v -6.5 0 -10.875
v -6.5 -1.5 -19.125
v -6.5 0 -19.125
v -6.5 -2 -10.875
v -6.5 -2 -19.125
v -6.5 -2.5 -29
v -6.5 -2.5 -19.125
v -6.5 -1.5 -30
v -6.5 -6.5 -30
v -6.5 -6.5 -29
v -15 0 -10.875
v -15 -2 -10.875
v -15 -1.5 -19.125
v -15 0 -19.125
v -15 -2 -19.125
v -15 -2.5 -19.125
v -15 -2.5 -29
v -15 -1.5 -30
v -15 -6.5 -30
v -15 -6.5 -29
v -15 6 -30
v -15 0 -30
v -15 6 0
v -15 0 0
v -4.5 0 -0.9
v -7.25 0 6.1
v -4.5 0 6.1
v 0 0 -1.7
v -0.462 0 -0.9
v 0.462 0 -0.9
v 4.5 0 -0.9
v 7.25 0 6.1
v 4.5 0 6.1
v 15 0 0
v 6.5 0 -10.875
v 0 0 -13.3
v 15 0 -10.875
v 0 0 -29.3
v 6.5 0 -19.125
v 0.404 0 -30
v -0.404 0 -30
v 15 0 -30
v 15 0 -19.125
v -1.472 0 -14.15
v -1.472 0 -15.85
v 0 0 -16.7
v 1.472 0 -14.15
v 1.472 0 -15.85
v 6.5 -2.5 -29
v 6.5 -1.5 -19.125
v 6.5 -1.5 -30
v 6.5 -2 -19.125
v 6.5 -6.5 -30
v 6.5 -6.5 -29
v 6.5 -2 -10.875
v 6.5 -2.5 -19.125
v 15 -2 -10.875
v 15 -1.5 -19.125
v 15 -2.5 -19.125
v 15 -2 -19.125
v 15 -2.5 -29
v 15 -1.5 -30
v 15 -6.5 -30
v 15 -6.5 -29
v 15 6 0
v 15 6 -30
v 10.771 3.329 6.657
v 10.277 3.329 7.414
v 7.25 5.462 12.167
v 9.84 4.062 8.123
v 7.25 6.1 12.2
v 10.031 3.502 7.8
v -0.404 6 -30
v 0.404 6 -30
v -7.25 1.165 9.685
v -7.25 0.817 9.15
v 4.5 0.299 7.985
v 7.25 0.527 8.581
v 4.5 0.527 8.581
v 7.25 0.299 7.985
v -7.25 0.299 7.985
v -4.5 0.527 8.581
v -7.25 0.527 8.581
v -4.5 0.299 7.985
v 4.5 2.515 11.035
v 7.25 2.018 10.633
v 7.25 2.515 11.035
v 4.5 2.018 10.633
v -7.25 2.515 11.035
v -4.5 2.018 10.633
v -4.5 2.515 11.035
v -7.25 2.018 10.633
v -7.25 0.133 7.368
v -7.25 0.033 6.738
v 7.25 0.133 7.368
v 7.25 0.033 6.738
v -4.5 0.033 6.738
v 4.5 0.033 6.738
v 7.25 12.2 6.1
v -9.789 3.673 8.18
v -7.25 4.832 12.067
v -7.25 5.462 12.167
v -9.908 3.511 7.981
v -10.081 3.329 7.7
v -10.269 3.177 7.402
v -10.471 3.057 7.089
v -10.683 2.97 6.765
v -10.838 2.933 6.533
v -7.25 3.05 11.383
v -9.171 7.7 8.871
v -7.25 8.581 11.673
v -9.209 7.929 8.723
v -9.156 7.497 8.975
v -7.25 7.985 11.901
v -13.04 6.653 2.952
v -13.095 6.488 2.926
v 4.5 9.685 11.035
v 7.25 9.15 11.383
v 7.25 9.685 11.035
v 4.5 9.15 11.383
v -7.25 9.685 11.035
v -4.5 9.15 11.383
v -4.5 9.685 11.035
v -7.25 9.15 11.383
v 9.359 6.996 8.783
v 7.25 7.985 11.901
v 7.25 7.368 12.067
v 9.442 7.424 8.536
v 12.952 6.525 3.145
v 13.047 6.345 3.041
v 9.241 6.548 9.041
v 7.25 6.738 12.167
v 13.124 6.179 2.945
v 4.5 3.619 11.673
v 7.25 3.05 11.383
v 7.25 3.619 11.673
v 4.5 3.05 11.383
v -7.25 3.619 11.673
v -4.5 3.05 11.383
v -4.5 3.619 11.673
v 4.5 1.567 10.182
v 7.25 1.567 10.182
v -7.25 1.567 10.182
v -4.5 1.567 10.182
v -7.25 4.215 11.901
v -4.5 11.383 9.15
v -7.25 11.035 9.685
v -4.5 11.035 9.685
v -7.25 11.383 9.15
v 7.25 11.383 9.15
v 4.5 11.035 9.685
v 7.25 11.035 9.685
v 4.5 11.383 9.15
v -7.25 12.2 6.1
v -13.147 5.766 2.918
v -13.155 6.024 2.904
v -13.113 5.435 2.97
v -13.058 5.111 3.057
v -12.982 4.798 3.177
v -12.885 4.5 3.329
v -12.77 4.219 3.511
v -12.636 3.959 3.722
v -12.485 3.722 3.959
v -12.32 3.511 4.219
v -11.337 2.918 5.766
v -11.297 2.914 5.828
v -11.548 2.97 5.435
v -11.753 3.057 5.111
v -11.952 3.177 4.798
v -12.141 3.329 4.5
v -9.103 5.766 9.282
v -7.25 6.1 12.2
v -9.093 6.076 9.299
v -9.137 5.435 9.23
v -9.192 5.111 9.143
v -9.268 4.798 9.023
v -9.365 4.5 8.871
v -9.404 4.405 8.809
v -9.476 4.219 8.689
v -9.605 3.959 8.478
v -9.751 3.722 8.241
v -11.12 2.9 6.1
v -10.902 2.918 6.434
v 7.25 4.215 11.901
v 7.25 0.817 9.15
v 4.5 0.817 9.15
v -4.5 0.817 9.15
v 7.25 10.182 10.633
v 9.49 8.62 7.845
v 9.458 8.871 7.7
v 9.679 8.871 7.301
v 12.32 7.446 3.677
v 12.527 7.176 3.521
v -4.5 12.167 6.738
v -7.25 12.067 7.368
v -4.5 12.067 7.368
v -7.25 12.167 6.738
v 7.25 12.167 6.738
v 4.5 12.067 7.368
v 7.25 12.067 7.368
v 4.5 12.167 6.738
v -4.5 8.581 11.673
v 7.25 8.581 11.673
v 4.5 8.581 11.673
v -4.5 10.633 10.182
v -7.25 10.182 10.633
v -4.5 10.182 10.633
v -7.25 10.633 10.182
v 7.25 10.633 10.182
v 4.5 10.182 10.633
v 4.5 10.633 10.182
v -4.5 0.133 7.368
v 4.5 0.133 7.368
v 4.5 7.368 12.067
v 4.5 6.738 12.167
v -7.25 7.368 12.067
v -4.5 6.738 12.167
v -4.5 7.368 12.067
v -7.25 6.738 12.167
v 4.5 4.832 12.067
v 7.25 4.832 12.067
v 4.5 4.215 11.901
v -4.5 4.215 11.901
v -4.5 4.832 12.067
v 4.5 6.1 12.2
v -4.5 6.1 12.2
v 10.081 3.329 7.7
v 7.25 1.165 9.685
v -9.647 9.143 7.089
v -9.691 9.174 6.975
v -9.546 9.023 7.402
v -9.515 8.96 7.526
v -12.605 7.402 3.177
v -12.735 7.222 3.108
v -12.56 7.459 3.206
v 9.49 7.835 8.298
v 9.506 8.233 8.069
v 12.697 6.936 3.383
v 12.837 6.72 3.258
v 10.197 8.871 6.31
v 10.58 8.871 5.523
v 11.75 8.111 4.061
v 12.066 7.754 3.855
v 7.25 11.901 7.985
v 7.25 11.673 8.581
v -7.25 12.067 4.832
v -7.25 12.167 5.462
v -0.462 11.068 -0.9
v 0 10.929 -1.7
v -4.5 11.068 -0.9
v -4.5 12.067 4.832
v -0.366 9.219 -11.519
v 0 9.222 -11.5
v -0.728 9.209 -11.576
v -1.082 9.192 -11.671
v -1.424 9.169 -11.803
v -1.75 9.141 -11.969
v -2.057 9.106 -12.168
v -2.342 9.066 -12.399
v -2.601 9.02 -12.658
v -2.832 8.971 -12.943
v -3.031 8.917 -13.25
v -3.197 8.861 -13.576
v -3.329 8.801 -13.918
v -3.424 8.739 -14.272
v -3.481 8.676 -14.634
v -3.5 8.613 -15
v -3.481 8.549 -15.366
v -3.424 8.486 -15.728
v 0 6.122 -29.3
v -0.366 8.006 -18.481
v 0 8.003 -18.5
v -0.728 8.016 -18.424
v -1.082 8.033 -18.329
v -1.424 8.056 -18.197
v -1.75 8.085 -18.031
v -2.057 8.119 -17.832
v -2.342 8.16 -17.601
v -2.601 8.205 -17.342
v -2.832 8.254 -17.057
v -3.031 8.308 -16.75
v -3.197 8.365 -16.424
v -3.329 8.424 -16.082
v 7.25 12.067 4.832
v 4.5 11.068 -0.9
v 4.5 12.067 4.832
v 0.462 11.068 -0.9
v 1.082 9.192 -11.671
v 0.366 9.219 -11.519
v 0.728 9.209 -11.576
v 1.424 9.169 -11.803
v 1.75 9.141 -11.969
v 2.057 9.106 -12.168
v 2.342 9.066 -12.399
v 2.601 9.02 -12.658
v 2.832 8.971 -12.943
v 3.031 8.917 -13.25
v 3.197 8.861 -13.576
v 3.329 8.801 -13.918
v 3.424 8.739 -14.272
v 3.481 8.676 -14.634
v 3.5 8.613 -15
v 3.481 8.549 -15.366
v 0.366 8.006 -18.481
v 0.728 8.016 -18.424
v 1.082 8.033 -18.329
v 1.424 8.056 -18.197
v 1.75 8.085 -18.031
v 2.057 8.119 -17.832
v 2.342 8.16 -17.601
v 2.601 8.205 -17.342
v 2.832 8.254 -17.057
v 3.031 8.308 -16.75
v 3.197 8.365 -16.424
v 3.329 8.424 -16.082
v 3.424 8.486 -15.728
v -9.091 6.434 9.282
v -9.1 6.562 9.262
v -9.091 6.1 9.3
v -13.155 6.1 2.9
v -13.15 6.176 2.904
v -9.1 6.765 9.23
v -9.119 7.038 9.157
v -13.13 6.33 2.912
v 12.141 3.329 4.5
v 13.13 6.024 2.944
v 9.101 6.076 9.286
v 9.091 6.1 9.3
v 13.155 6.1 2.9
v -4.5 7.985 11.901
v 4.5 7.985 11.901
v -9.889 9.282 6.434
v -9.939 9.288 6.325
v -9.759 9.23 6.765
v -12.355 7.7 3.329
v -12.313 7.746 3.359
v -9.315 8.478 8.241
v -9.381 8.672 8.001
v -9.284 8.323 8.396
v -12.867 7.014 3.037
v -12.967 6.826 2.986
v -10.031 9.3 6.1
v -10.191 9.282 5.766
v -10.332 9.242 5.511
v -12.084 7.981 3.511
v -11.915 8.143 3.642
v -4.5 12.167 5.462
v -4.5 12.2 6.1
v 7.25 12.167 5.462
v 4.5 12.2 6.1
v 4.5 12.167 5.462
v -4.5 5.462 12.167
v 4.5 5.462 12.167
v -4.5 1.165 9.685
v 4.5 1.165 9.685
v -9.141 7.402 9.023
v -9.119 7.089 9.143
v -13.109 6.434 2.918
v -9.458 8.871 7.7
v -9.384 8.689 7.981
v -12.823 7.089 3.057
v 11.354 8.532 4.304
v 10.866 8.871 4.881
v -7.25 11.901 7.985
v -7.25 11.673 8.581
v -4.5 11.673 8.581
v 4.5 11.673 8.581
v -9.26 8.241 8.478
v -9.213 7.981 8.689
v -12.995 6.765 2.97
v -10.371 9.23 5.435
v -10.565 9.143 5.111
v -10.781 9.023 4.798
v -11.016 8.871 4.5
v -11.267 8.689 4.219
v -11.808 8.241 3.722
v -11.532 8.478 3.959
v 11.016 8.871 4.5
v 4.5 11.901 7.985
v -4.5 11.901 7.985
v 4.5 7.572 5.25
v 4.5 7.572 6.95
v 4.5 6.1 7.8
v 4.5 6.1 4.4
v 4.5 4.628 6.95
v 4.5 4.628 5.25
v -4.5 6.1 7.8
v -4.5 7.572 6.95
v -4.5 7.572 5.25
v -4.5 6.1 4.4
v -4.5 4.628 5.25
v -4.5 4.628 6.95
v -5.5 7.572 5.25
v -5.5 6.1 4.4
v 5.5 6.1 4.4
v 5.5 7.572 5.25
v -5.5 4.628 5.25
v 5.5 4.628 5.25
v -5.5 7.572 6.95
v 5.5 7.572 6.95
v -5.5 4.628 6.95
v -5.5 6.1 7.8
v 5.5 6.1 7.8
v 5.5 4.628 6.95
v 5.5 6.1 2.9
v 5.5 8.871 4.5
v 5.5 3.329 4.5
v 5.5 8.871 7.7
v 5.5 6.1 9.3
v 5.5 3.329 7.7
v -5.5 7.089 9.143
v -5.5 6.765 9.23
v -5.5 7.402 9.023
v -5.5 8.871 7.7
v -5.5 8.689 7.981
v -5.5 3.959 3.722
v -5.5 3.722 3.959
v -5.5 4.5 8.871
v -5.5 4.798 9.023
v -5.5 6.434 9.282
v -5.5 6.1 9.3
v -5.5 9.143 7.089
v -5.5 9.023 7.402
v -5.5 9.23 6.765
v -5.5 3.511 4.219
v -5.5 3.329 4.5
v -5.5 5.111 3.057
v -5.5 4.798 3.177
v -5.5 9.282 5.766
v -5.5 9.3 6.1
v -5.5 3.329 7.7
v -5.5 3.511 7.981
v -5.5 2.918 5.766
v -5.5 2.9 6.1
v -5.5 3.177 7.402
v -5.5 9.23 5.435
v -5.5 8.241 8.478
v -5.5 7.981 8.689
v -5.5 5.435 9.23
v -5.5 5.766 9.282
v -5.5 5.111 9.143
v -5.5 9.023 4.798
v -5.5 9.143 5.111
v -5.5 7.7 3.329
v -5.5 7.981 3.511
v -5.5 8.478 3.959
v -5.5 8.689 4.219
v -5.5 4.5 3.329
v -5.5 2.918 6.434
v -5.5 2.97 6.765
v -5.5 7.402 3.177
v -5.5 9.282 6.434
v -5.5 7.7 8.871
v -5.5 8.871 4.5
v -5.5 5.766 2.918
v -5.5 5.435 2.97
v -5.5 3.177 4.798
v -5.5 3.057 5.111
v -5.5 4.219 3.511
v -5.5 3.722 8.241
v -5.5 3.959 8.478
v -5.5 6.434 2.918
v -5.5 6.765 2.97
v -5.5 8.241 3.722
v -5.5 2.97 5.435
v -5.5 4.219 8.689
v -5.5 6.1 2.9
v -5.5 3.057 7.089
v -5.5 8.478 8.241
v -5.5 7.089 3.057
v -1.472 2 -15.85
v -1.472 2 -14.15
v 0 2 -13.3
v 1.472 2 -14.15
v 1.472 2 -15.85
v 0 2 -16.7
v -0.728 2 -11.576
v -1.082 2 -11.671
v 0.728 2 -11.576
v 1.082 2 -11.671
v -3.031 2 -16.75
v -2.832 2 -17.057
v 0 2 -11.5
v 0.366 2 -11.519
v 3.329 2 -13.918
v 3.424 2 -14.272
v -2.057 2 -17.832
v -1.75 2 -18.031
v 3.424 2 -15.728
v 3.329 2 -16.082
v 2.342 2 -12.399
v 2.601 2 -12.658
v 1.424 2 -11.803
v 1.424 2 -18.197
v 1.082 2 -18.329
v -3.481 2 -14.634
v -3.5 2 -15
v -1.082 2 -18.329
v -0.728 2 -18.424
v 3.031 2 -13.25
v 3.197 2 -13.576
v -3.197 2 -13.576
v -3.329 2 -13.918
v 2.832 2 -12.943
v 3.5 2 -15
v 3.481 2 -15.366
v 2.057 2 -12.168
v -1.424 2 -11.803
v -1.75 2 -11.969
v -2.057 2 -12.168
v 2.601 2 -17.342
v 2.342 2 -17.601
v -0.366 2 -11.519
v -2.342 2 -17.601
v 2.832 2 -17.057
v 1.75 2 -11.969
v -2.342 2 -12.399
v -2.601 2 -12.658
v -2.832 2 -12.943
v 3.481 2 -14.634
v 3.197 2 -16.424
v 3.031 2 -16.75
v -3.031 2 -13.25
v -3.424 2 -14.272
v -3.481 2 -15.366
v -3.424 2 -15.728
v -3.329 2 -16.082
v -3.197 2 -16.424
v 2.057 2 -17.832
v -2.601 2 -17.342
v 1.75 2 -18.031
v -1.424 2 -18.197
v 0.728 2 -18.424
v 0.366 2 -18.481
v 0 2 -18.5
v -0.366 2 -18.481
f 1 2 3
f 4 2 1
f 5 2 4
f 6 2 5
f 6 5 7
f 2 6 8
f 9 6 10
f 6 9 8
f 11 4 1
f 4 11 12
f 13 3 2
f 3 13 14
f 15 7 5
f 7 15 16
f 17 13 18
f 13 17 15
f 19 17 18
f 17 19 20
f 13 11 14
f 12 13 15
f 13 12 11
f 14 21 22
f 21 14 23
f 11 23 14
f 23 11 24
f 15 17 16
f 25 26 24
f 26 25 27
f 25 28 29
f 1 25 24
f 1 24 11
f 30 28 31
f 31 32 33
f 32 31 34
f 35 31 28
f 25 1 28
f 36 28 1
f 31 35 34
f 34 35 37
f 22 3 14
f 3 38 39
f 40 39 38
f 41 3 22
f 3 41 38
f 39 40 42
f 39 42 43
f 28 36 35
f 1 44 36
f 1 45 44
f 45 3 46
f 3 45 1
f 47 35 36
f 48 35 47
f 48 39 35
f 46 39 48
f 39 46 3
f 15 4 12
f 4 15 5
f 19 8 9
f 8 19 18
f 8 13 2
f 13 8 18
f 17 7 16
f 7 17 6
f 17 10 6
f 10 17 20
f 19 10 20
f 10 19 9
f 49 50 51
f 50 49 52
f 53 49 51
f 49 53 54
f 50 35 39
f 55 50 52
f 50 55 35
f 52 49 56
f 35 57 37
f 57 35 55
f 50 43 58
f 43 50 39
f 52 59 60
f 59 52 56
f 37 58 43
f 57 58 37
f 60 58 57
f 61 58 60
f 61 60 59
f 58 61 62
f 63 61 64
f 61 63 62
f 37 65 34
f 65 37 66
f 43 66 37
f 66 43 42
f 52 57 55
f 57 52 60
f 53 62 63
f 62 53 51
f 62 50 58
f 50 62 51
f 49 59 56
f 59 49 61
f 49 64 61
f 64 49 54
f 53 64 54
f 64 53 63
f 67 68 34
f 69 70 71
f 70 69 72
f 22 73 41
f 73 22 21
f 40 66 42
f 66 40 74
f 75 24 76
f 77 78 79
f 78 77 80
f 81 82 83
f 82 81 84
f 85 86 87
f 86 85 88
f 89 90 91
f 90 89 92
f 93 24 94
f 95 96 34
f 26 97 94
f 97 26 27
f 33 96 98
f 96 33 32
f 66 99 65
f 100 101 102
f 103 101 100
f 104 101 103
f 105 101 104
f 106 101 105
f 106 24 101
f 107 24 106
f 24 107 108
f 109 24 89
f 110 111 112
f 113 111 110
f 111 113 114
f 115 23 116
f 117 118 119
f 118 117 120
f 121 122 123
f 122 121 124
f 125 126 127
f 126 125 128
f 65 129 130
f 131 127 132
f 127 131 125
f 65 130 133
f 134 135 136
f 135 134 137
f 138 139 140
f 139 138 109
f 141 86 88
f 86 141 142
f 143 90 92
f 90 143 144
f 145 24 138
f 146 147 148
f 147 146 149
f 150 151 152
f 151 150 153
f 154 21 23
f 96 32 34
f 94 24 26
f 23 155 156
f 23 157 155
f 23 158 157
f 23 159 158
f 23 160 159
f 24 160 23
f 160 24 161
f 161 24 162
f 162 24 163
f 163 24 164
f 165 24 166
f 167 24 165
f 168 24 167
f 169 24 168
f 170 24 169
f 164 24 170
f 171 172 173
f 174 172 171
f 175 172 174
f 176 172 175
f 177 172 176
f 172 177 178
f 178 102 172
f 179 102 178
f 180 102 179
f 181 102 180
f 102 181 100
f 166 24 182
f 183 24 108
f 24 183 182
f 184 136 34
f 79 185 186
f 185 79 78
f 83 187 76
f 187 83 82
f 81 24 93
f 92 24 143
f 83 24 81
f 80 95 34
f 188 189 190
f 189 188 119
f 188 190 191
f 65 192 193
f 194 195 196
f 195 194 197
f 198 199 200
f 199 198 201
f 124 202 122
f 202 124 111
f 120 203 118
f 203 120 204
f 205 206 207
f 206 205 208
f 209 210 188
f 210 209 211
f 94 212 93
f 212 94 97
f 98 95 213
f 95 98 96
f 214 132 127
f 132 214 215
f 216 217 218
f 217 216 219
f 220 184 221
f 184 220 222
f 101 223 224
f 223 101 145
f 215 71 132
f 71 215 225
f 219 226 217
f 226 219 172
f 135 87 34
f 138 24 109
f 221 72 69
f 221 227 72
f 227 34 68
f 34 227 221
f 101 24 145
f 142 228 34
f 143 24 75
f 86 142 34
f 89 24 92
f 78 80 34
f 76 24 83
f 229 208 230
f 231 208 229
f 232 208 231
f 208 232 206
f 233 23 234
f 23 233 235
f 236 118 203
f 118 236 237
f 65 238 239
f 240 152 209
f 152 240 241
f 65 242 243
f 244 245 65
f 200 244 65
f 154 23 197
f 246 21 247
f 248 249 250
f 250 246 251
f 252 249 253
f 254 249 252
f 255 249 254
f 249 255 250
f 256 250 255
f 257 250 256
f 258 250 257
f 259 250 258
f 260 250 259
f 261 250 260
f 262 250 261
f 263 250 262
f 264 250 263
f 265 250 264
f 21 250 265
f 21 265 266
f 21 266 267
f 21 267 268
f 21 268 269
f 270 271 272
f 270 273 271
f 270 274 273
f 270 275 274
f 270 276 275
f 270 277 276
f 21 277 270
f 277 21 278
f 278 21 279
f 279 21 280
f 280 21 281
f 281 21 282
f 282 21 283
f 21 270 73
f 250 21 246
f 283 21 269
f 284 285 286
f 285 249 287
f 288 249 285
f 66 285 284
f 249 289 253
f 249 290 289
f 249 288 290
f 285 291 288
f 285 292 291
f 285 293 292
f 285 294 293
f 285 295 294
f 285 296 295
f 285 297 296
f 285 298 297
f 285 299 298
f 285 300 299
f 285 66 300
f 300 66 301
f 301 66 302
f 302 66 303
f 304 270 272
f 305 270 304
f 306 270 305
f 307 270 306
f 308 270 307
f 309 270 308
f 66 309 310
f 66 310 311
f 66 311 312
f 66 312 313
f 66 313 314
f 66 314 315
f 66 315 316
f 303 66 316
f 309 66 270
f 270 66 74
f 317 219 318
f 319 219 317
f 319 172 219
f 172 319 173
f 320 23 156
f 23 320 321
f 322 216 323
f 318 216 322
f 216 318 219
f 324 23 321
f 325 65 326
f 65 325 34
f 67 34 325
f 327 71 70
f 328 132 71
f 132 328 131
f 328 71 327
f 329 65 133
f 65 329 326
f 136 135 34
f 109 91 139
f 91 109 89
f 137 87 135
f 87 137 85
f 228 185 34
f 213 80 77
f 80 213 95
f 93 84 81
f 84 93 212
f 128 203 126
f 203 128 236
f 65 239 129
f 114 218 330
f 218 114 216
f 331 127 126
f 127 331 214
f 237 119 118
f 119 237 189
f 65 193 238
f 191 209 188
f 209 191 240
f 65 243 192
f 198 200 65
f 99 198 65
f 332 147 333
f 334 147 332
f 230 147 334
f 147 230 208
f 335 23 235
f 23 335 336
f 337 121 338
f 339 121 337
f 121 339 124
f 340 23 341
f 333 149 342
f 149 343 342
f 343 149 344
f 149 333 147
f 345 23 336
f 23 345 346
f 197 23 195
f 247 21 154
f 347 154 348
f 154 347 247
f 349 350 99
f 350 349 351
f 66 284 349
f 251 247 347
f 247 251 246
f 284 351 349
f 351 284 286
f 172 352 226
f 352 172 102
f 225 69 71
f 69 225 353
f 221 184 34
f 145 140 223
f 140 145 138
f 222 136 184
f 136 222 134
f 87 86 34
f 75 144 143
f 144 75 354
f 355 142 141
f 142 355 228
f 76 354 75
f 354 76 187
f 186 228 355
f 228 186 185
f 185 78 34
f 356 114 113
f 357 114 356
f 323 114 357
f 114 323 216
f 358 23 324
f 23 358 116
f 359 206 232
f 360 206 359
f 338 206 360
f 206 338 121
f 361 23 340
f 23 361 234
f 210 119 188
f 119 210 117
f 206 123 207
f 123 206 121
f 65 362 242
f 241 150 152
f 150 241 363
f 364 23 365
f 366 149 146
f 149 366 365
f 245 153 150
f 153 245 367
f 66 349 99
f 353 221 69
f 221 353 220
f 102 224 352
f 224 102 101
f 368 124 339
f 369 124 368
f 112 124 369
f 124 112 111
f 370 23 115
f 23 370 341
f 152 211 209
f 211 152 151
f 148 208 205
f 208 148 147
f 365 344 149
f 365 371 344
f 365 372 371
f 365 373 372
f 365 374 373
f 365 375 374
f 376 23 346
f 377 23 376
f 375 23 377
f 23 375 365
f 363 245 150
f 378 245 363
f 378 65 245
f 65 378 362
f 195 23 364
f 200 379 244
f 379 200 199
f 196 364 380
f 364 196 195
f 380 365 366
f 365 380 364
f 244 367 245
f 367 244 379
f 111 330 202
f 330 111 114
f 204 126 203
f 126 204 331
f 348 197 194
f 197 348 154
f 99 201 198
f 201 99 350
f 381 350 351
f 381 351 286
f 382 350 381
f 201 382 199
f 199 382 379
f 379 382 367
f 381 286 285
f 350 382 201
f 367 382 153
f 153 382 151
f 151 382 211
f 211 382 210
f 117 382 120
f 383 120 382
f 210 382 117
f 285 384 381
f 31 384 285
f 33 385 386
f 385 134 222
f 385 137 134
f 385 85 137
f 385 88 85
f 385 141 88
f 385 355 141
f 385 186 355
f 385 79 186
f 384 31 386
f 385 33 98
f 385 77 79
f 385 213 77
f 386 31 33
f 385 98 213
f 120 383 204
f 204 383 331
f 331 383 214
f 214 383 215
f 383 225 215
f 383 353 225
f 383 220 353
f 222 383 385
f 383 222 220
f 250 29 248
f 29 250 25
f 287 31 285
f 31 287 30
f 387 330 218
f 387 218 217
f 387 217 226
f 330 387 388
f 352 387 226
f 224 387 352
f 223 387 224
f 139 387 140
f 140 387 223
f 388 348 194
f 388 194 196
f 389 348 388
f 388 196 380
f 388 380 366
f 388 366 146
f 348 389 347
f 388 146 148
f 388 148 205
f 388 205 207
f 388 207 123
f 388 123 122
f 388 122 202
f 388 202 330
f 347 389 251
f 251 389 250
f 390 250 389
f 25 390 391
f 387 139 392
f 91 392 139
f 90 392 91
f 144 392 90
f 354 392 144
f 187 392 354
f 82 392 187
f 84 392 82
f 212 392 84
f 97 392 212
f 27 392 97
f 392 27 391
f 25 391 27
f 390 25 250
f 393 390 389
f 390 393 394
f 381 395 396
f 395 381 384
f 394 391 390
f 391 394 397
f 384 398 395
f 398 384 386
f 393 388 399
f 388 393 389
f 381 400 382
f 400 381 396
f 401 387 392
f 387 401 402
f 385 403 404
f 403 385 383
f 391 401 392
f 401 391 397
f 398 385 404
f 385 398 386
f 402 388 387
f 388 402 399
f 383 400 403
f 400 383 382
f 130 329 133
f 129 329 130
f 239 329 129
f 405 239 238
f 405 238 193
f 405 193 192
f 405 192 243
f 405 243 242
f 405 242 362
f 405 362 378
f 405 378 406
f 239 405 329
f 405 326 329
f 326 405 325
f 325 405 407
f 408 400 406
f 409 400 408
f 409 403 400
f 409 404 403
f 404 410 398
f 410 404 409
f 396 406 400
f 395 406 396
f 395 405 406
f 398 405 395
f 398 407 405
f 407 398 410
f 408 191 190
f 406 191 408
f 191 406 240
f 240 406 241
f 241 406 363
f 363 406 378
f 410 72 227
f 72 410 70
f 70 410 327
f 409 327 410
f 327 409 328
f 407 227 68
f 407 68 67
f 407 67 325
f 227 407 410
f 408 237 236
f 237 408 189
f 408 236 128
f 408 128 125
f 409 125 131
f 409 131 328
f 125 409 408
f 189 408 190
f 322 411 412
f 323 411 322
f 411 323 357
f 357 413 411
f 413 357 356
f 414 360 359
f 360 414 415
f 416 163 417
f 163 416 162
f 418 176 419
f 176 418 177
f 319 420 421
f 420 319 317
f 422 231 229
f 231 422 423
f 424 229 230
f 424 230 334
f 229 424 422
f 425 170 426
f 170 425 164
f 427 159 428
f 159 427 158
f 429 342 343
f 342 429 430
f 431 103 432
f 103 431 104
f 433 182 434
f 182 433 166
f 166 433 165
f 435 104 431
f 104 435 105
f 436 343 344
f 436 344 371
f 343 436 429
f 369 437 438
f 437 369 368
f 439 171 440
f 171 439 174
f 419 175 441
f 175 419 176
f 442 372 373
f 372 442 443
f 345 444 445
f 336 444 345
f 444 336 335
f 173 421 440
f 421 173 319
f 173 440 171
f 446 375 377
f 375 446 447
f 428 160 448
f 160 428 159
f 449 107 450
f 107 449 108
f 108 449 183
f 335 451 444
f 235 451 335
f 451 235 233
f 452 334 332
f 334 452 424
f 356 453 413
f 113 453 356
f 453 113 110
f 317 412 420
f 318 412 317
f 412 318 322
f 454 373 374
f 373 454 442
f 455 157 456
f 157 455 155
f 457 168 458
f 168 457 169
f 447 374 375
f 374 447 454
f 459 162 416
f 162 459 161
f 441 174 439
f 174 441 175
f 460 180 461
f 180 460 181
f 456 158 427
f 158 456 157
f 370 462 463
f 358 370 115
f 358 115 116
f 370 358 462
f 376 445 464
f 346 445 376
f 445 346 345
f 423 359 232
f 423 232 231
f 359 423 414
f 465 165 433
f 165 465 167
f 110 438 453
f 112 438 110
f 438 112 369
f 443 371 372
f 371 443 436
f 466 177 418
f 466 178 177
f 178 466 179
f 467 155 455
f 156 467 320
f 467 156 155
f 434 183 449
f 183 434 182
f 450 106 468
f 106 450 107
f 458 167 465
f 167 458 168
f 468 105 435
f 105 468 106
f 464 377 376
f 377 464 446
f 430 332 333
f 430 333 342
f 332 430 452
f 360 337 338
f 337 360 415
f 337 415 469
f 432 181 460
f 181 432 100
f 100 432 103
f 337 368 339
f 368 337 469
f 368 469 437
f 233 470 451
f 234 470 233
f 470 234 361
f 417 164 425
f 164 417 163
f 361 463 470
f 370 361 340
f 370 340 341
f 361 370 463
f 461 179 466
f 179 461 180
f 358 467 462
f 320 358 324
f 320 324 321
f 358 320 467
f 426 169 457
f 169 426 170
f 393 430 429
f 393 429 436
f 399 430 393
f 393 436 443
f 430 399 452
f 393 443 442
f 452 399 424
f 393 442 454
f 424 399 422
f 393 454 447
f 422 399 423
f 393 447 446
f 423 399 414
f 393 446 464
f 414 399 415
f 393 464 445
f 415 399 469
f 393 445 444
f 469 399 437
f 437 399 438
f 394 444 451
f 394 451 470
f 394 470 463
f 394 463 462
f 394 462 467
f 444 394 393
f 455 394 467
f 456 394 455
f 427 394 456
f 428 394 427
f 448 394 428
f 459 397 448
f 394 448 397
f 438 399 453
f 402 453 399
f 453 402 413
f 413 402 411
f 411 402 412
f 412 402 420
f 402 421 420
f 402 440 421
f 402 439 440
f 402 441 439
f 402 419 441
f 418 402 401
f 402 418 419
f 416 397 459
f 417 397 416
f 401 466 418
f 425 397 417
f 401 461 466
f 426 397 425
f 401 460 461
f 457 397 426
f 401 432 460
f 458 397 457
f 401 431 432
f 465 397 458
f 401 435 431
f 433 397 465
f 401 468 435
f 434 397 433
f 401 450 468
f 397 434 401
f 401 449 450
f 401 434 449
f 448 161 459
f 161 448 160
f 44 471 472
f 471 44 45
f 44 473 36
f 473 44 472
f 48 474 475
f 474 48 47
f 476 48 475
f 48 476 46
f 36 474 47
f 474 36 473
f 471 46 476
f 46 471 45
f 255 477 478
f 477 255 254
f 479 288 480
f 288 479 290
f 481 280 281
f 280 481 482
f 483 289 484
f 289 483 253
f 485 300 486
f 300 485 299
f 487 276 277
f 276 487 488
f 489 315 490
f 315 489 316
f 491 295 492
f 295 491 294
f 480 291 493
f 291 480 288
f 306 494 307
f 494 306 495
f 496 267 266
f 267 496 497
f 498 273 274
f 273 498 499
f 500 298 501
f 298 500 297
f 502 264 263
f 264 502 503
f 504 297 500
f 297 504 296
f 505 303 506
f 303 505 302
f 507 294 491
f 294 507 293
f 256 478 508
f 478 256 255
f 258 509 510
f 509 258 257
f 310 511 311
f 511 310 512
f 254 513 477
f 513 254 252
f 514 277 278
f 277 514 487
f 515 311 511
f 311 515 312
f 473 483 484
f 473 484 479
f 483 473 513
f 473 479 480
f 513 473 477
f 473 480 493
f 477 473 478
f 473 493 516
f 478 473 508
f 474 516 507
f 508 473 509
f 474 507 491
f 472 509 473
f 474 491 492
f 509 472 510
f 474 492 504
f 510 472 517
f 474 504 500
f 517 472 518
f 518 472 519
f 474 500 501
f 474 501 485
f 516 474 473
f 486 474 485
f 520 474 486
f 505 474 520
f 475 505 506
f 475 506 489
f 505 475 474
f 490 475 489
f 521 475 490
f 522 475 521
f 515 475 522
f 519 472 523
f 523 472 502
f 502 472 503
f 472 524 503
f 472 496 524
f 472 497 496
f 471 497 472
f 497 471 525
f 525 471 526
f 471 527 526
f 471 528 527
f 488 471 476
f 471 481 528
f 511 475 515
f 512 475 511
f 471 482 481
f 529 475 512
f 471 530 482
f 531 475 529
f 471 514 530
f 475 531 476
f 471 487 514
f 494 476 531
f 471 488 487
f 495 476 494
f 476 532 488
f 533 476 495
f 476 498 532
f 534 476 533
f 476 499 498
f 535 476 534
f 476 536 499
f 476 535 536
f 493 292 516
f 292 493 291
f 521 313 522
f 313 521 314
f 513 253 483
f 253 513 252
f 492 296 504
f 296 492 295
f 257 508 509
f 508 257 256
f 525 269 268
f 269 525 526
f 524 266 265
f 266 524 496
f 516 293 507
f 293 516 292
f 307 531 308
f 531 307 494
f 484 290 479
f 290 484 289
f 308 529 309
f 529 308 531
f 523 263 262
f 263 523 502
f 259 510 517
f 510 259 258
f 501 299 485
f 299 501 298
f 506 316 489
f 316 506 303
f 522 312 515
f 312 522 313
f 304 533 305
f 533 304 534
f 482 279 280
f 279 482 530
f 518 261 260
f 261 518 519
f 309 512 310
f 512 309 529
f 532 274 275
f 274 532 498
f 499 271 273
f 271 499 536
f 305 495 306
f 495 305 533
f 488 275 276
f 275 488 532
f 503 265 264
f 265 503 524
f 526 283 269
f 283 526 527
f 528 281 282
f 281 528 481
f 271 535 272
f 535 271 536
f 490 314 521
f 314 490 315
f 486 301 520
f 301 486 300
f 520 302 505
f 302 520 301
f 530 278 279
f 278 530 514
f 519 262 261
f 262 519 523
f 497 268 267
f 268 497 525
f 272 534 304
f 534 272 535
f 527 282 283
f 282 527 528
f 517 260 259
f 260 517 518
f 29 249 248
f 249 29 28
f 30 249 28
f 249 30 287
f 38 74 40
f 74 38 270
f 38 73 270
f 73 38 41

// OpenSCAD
// file: common_dimensions.scad
x_rod_distance = 45;

thinwall = 3;

belt_width = 6;
belt_thickness = 1.5;

// Account for idler bearing and stepper pinion being different diameters
x_stepper_pinion_od = 12.0;
x_idler_bearing_od = 9.8; // 608 bearing
x_idler_bearing_id = 3.0; // 608 bearing
x_idler_bearing_width = 8.5; // 608 bearing
x_idler_to_stepper_offset = (x_stepper_pinion_od-x_idler_bearing_od)/2; 


// T8 NUT dimensions
t8nut_od = 22.0;
t8nut_id = 10.25; // 10.25; // 10.25 actual, 12.0 for spring on anti-backlash nut
t8nut_id_clearance = 14.0 + 3; // 
//t8nut_id = 10.2; //10.2 actual

// Z rod/bearing dimensions
z_rod_diam = 10.0; 
z_rod_diam_tight = z_rod_diam - 0.07; // Adjust diam based on test prints
z_bearing_diam = 19.0; // LM10UU
z_bearing_length = 29.0; // LM10UU

// X rod/bearing dimensions
x_rod_diam = 10.0; 
x_rod_diam_tight = x_rod_diam - 0.07; // Adjust tightness based on test prints
x_bearing_diam = 19.0; // LM10UU
x_bearing_length = 29.0; // LM10UU

z_bottom_wall_width = 4;
z_bottom_width = 43 + 2*z_bottom_wall_width;
z_bottom_height = 43;

z_top_wall_width = z_bottom_wall_width;
z_top_width = 30;
z_top_height = 22;
z_top_generate_rod_holder = false; // Optionally generate a Z rod holder, which limits the length of the Z rod, or no holder, which allows a longer Z rod to be used.

z_rod_to_rail = z_bottom_wall_width + 43/2 + 3; // Z-rod center (and X-axis) offset from 3030 rail front face - dictated by NEMA17 stepper center (44mm / side)
z_rod_to_base = t8nut_id_clearance/2 + 1; // Z-rod center offset from x-end front face

z_motor_ofs = z_bearing_diam/2 + thinwall + t8nut_id_clearance/2 + 1; //17; // Z-motor offset from Z-rod (center-to-center) - both are aligned with X axis

z_beam_motor_ofs = 10; // Z-rod center offset from Z beam center

x_end_belt_hole_height = x_rod_distance-x_rod_diam-2*thinwall; //31-5; // To fit between NEMA17 mounting screws
x_end_belt_hole_width = x_idler_bearing_width+1; // x_end_base_depth-2*thinwall; // 10;
x_end_base_height = x_rod_distance + x_rod_diam + 2*thinwall; //58 + 10;
x_end_base_depth = 18; // x_end_belt_hole_width + 2*thinwall; //18; //17; // NOTE: Manually adjust to prevent X rod cutout interference with Z linear bearing cutouts
x_end_base_width = x_bearing_diam + 2*thinwall + 1 + 8+4;
x_end_idler_open_end = true; // Specify whether x-idler end has closed ends with tension screws, or straight rod cutouts to allow longer rods.

x_to_z_offset = x_end_base_depth/2+z_rod_to_base; // 15; // Used to offset the X pushrods/belt from the Z rod.

z_bearing_size = z_bearing_diam + 2 * thinwall;

y_rod_diam = 10.0;
y_rod_diam_tight = y_rod_diam - 0.0; // Adjust tightness based on test prints
y_rod_to_rail = 2*thinwall + y_rod_diam/2; // y rod center to 3030 rail.  11+4 from Haribo holder with 8mm rod. Use 2x thinwall to give room for ziptie hole.
y_rod_screw_diam = 3.0;

// 16T gt2 bearing
y_idler_bearing_od = 9.8; 
y_idler_bearing_id = 3.0; 
y_idler_bearing_width = 8.5; 

// Dimensions of the Y beltholder component (the sliding piece)
y_beltholder_width = 18;
y_beltholder_height = 2 + 9 + 2;
y_beltholder_depth = 6 + 2;

// Dimensions of the Y beltholder base component (that mounts to the plate)
y_beltholder_base_height = 9 + y_beltholder_height + 2;
y_beltholder_base_width = 2*y_beltholder_width + 10;
y_beltholder_base_depth = y_beltholder_depth + 8;

y_belt_to_plate = 9 + y_beltholder_height/2;
y_idler_to_plate = y_belt_to_plate + y_idler_bearing_od/2;

//y_plate_to_belt = 2*thinwall; // Bottom of plate to top of belt

y_bearing_od = 19.0; // LM10uu
y_bearing_length = 29.0; // LM10uu

y_bearing_holder_width = 50;
y_bearing_holder_depth = y_bearing_length;
y_bearing_holder_rod_ofs = thinwall*2 + y_bearing_od/2; // Offset from Y rod to mounting plate.  Use 2x thinwall to give room for ziptie hole.
y_bearing_holder_height = y_bearing_holder_rod_ofs+y_bearing_od*0.25;

y_rail_to_plate = y_rod_to_rail + y_bearing_holder_rod_ofs; // Offset from top of 3030 rail to bottom of mounting plate
y_rail_to_idler = y_rail_to_plate - y_idler_to_plate; // Offset from top of 3030 rail to center of idler (and stepper)

z_railguide_width = 8.30; // 3030
z_railguide_depth = 2.0;
z_railguide_keepout = 12; // 3030 dropin nut is 11, plus margin
// main file
// PRUSA iteration3
// Y idler
// GNU GPL v3
// Josef Průša <iam@josefprusa.cz> and contributors
// http://www.reprap.org/wiki/Prusa_Mendel
// http://prusamendel.org

include <common_dimensions.scad>

y_idler_width = 30;

module y_idler_base(){
    hull() {
        translate([-y_idler_width/2,0,0]) rotate([-90,0,0]) cube([y_idler_width,30,6]);
        translate([0,y_rail_to_idler,y_rail_to_idler]) rotate([0,90,0]) cylinder(d=y_rail_to_idler*2, h=y_idler_bearing_width+6, $fn=60, center=true);
    }
    translate([0,y_rail_to_idler,y_rail_to_idler]) rotate([0,90,0]) cylinder(d=y_idler_bearing_od, h=y_idler_bearing_width, $fn=60, center=true);

    // Rail guide + support
    for (i=[0,1]) mirror([i,0,0]) {
        translate([-y_idler_width/2,-z_railguide_depth,-15-8.25/2]) cube([(y_idler_width-z_railguide_keepout-1)/2,z_railguide_depth,8.25]);
        translate([-y_idler_width/2,-z_railguide_depth-0.5,-30]) cube([(y_idler_width-z_railguide_keepout-1)/2,1,15-8.25/2]);
        translate([-y_idler_width/2,-z_railguide_depth-0.5-4,-30]) cube([(y_idler_width-z_railguide_keepout-1)/2,4,1]);
    }

}

module y_idler_holes(){

    // Cutout for the bearing itself
    translate([-(y_idler_bearing_width+0.5)/2,-50,y_rail_to_idler-14/2]) cube([y_idler_bearing_width+0.5, 100, 14]);
    
    // M3 screw to mount bearing
    translate([0,y_rail_to_idler,y_rail_to_idler]) rotate([0,90,0]) cylinder(d=3.4, h=100, $fn=6, center=true);

    // Nut trap for M3 screw (1mm wall)
    translate([y_idler_bearing_width/2+0.25+1,y_rail_to_idler,y_rail_to_idler]) rotate([0,90,0]) cylinder(d=6.4, h=100, $fn=6, center=false);

    // Nut trap for M3 screw (1mm wall)
    translate([-(y_idler_bearing_width/2+0.25+1),y_rail_to_idler,y_rail_to_idler]) rotate([0,-90,0]) cylinder(d=6.4, h=100, $fn=60, center=false);

    // M3 screw to mount to rail
    translate([0,0,-15]) rotate([-90,-90,0]) cylinder(d=3.4, h=100, $fn=6, center=false);
    translate([0,2,-15]) rotate([-90,-90,0]) cylinder(d=7.0, h=100, $fn=60, center=false);

    // Center line markers
    translate([0,0,0]) rotate([-90,90,0]) cylinder(d=3.4, h=100, $fn=3, center=true);
    translate([0,0,-31]) rotate([-90,-90,0]) cylinder(d=3.4, h=100, $fn=3, center=true);
    
}

// Final part
module y_idler(){
    difference(){
        y_idler_base();
        y_idler_holes();
    }
}

y_idler();
